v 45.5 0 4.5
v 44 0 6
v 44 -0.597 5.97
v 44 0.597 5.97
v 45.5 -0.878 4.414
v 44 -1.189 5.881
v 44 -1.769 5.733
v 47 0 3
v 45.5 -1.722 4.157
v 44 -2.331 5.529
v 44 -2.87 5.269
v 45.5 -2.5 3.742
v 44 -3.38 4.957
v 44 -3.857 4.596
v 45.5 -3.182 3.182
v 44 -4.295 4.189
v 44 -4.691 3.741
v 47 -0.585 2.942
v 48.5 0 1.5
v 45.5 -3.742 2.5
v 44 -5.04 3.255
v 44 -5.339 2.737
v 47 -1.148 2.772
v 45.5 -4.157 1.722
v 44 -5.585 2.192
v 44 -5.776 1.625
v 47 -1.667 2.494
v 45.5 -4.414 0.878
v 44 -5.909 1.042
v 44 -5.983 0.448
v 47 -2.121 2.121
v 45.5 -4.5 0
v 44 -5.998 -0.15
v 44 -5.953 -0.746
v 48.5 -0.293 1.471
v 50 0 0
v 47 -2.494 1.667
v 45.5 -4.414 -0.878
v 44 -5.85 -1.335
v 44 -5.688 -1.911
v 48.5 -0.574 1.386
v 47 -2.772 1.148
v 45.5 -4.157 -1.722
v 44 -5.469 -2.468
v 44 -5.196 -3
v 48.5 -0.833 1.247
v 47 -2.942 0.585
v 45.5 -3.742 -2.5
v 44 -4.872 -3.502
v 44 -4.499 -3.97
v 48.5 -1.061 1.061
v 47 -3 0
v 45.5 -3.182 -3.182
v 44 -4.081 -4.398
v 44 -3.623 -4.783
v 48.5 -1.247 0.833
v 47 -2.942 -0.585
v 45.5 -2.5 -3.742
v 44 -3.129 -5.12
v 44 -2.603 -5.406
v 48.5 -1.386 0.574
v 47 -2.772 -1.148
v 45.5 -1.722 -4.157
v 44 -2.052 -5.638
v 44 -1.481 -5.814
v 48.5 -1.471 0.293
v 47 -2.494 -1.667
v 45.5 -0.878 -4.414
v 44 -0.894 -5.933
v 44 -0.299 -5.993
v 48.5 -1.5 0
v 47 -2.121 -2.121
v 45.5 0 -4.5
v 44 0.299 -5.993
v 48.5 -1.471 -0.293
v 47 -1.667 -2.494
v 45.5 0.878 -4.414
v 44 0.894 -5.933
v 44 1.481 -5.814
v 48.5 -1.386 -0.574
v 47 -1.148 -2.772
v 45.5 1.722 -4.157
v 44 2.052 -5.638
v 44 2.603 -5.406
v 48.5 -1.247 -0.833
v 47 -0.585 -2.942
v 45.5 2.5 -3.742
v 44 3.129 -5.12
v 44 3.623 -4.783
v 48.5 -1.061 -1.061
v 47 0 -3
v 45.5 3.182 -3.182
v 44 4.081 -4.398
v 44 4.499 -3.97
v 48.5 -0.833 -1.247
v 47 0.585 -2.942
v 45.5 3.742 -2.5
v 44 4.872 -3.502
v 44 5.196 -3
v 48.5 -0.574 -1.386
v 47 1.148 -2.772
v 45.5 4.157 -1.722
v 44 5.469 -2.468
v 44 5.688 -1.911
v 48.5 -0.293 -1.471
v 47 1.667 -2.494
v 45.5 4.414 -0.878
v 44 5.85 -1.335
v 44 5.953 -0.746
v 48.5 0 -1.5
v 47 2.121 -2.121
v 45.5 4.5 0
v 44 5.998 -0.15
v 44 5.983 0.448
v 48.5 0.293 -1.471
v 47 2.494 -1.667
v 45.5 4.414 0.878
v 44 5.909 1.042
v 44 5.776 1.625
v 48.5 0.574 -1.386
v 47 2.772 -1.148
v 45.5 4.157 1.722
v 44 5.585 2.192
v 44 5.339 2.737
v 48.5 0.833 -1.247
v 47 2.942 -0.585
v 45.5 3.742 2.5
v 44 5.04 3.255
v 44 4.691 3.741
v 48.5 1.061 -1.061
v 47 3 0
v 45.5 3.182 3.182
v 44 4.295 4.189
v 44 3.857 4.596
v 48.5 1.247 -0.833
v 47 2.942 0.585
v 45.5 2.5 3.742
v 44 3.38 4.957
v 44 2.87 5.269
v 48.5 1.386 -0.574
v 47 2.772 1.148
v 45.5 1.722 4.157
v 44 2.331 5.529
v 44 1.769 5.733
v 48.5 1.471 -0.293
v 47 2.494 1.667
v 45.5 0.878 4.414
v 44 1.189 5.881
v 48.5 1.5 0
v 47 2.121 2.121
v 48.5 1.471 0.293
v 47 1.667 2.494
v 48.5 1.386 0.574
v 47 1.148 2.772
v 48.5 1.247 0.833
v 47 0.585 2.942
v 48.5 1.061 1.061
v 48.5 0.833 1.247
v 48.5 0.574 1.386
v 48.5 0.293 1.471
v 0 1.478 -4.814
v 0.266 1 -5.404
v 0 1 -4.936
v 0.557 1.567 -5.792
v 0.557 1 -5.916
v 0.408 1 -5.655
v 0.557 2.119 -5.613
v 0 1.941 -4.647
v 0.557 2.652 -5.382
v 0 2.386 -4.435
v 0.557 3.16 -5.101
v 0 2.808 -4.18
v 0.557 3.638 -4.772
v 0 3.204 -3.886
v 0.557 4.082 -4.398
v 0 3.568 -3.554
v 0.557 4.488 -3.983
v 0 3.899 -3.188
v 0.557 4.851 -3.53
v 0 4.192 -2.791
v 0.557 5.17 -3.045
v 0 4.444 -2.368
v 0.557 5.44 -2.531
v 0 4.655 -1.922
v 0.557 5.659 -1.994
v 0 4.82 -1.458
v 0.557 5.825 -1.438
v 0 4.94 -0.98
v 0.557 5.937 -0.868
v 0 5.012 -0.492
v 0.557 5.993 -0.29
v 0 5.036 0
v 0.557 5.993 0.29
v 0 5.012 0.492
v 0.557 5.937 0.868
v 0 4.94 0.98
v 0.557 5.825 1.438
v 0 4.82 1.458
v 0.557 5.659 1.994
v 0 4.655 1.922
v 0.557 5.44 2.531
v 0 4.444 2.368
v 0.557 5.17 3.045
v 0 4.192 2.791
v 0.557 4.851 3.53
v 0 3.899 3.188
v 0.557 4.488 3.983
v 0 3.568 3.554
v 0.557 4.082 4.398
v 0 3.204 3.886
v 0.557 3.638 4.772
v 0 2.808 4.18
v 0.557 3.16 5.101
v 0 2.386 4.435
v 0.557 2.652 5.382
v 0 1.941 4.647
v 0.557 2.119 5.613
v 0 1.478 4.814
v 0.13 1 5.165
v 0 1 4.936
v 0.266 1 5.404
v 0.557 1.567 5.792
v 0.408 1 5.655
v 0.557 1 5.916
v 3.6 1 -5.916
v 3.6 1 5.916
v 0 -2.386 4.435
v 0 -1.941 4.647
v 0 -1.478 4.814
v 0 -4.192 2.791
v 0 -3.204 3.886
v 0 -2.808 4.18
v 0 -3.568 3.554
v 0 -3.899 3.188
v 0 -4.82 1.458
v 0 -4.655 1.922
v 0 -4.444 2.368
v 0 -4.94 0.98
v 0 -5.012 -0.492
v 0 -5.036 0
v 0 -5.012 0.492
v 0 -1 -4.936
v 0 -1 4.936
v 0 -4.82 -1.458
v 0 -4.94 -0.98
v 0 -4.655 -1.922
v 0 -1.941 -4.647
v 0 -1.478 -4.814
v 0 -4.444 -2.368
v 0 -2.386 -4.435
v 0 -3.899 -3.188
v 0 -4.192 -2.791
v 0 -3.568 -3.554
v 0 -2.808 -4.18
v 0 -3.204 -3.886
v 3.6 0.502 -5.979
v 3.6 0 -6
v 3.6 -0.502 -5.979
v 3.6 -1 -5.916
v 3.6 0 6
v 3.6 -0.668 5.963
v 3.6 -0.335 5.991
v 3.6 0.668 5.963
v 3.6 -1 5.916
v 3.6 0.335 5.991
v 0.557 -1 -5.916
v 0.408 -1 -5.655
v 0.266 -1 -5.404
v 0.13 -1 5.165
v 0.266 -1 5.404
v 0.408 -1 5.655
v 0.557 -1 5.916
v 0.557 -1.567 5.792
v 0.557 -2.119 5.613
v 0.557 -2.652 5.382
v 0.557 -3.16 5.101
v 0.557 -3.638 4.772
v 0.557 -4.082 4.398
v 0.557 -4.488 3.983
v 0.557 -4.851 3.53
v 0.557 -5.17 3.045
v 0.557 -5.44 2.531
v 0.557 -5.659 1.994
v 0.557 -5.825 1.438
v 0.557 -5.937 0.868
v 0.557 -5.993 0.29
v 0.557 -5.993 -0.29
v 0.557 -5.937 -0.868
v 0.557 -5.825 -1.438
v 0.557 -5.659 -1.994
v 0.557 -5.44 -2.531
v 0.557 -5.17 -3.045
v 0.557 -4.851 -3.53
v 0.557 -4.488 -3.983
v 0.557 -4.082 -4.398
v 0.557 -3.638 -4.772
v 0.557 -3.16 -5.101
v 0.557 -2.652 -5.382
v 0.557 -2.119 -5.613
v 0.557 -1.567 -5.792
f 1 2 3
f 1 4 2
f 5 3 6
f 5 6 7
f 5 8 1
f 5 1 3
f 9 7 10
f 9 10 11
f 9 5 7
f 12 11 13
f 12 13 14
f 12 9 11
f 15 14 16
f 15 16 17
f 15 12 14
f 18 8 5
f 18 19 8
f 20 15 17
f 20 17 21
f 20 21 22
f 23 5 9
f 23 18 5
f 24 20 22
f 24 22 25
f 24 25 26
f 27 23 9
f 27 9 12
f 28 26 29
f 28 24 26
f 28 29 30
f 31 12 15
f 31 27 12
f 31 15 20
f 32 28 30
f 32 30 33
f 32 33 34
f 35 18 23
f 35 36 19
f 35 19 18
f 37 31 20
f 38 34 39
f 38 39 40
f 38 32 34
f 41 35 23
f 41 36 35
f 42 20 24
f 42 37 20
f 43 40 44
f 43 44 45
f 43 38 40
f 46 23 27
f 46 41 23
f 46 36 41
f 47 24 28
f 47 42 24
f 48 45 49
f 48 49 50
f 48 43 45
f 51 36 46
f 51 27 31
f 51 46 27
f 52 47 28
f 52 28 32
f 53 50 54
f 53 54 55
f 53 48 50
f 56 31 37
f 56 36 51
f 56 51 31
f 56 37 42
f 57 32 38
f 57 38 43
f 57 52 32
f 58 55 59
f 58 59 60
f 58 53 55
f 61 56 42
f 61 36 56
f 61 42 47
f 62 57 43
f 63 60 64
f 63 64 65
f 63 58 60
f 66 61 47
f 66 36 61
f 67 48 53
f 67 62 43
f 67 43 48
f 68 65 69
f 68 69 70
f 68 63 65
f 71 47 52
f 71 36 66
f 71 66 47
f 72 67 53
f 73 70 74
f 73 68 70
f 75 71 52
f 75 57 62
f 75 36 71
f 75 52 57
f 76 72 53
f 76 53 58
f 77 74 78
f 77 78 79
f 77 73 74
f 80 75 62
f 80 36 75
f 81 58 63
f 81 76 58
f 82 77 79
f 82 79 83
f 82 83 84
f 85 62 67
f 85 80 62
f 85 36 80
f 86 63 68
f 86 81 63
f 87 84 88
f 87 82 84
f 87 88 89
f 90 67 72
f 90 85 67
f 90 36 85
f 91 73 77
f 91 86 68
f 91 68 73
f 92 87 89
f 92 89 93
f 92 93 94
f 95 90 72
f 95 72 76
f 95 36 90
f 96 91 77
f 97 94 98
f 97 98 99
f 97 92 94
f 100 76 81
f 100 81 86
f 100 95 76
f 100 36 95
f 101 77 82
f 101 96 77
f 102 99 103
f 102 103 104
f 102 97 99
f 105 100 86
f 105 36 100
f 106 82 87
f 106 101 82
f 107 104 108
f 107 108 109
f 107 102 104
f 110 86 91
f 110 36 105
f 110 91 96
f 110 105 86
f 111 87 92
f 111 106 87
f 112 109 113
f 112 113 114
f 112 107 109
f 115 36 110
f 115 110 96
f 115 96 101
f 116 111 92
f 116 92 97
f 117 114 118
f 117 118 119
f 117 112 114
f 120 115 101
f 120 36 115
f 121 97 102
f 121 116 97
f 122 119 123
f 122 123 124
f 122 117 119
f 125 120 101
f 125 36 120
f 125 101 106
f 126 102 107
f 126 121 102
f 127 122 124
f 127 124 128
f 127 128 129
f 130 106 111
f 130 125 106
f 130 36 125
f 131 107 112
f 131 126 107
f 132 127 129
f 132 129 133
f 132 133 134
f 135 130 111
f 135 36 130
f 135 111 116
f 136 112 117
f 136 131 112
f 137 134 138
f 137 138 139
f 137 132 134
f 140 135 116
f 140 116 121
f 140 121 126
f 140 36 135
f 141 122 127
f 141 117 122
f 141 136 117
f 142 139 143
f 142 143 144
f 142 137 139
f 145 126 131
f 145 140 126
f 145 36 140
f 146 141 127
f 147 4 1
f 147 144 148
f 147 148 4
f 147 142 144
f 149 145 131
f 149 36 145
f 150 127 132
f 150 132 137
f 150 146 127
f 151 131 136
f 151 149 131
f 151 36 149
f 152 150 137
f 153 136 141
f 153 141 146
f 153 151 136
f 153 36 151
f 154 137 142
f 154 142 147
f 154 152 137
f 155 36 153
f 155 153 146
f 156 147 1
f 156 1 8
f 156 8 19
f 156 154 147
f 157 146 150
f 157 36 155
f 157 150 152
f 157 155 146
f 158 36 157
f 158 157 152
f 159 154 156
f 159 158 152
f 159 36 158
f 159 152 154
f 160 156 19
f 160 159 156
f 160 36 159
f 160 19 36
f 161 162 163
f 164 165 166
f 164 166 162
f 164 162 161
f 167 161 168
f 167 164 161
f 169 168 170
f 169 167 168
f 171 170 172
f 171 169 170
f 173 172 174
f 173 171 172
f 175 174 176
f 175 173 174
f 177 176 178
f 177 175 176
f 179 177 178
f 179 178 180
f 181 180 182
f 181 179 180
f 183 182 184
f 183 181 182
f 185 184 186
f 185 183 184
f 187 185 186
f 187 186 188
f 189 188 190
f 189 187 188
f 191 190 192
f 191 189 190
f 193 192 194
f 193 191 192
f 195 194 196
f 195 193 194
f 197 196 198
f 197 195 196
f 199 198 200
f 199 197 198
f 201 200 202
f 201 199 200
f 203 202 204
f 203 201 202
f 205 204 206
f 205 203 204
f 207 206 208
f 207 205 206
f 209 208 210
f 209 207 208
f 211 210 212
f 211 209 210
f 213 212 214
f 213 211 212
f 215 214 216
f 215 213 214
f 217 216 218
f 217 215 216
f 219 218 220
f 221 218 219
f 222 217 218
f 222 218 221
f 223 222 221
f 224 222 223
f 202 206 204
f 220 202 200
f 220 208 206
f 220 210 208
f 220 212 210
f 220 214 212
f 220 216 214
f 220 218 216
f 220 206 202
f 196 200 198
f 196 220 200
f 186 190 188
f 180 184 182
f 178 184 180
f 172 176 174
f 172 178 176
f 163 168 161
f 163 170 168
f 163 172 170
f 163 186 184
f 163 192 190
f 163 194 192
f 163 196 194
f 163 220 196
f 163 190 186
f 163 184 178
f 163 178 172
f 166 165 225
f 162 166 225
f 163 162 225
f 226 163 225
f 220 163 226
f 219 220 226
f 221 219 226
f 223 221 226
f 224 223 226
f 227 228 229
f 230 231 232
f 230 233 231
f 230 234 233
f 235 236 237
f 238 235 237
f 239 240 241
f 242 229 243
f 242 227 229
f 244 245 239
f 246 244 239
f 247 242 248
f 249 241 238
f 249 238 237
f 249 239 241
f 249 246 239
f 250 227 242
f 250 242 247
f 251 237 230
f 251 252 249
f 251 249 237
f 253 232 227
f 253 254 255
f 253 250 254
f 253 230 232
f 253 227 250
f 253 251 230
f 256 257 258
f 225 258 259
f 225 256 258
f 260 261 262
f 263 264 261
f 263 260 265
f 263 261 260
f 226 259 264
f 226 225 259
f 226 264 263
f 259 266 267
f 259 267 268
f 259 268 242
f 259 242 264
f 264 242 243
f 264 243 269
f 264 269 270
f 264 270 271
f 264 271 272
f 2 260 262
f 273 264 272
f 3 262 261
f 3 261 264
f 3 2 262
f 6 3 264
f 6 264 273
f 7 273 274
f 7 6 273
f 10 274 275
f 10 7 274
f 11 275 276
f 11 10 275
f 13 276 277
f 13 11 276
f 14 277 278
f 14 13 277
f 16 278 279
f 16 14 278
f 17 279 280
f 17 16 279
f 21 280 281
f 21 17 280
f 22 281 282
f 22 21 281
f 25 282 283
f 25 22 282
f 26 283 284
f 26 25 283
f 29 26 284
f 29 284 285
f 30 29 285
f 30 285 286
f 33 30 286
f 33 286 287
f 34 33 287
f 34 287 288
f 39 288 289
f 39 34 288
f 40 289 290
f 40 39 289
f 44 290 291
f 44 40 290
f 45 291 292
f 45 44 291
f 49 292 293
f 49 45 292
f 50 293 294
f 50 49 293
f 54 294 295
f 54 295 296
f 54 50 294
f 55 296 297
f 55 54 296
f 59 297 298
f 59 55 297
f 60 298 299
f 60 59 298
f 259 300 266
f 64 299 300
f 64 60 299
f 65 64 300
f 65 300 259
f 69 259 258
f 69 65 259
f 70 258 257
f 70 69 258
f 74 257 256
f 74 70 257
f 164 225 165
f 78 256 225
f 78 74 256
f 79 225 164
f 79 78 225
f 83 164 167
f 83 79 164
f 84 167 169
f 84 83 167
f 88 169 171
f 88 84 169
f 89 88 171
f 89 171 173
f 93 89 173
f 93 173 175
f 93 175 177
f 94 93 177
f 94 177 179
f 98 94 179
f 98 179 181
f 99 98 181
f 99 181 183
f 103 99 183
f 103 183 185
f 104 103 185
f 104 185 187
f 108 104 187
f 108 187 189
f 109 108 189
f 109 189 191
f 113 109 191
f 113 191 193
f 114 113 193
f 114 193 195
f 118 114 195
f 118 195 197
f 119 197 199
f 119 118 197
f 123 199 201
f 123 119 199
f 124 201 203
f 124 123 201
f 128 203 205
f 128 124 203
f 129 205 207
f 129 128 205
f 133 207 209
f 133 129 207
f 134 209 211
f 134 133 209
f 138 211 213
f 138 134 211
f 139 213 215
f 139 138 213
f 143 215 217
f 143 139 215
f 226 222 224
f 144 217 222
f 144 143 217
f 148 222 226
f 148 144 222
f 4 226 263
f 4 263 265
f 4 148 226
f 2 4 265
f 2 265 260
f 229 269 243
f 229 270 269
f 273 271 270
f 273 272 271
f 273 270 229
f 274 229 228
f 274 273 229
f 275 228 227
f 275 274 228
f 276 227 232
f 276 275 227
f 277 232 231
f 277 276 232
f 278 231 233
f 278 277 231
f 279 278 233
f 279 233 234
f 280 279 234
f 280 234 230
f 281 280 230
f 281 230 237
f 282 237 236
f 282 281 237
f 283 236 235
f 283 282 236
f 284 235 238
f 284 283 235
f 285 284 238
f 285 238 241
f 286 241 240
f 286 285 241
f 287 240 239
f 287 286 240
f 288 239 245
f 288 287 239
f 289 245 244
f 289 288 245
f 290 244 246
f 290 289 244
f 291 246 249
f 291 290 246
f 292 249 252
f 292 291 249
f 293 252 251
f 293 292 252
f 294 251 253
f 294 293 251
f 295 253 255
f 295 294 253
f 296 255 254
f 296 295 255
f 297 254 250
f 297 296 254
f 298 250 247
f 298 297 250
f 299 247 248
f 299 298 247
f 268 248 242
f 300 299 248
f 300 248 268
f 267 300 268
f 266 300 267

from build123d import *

# Parameters (mm, degrees)
SKETCH2_W  = 12
SKETCH2_H  = 2
SLOT_DEPTH = 3.6


with BuildPart() as part:
    # BodySke → BaseBody (revolve)
    with BuildSketch(Plane.XY, mode=Mode.PRIVATE) as basebody_sk:
        Polygon((0, 0), (0, 5.036), (0.556565659, 6), (44, 6), (50, 0), align=None)
    revolve(basebody_sk.sketch.rotate(Axis((-12.7, 0, 0), (1, 0, 0)), 90), axis=Axis((-12.7, 0, 0), (1, 0, 0)))

    # Sketch2 → Slot (cut)
    with BuildSketch(Plane.ZY):
        Rectangle(SKETCH2_W, SKETCH2_H)
    extrude(amount=-SLOT_DEPTH, mode=Mode.SUBTRACT)


solid = part.part
